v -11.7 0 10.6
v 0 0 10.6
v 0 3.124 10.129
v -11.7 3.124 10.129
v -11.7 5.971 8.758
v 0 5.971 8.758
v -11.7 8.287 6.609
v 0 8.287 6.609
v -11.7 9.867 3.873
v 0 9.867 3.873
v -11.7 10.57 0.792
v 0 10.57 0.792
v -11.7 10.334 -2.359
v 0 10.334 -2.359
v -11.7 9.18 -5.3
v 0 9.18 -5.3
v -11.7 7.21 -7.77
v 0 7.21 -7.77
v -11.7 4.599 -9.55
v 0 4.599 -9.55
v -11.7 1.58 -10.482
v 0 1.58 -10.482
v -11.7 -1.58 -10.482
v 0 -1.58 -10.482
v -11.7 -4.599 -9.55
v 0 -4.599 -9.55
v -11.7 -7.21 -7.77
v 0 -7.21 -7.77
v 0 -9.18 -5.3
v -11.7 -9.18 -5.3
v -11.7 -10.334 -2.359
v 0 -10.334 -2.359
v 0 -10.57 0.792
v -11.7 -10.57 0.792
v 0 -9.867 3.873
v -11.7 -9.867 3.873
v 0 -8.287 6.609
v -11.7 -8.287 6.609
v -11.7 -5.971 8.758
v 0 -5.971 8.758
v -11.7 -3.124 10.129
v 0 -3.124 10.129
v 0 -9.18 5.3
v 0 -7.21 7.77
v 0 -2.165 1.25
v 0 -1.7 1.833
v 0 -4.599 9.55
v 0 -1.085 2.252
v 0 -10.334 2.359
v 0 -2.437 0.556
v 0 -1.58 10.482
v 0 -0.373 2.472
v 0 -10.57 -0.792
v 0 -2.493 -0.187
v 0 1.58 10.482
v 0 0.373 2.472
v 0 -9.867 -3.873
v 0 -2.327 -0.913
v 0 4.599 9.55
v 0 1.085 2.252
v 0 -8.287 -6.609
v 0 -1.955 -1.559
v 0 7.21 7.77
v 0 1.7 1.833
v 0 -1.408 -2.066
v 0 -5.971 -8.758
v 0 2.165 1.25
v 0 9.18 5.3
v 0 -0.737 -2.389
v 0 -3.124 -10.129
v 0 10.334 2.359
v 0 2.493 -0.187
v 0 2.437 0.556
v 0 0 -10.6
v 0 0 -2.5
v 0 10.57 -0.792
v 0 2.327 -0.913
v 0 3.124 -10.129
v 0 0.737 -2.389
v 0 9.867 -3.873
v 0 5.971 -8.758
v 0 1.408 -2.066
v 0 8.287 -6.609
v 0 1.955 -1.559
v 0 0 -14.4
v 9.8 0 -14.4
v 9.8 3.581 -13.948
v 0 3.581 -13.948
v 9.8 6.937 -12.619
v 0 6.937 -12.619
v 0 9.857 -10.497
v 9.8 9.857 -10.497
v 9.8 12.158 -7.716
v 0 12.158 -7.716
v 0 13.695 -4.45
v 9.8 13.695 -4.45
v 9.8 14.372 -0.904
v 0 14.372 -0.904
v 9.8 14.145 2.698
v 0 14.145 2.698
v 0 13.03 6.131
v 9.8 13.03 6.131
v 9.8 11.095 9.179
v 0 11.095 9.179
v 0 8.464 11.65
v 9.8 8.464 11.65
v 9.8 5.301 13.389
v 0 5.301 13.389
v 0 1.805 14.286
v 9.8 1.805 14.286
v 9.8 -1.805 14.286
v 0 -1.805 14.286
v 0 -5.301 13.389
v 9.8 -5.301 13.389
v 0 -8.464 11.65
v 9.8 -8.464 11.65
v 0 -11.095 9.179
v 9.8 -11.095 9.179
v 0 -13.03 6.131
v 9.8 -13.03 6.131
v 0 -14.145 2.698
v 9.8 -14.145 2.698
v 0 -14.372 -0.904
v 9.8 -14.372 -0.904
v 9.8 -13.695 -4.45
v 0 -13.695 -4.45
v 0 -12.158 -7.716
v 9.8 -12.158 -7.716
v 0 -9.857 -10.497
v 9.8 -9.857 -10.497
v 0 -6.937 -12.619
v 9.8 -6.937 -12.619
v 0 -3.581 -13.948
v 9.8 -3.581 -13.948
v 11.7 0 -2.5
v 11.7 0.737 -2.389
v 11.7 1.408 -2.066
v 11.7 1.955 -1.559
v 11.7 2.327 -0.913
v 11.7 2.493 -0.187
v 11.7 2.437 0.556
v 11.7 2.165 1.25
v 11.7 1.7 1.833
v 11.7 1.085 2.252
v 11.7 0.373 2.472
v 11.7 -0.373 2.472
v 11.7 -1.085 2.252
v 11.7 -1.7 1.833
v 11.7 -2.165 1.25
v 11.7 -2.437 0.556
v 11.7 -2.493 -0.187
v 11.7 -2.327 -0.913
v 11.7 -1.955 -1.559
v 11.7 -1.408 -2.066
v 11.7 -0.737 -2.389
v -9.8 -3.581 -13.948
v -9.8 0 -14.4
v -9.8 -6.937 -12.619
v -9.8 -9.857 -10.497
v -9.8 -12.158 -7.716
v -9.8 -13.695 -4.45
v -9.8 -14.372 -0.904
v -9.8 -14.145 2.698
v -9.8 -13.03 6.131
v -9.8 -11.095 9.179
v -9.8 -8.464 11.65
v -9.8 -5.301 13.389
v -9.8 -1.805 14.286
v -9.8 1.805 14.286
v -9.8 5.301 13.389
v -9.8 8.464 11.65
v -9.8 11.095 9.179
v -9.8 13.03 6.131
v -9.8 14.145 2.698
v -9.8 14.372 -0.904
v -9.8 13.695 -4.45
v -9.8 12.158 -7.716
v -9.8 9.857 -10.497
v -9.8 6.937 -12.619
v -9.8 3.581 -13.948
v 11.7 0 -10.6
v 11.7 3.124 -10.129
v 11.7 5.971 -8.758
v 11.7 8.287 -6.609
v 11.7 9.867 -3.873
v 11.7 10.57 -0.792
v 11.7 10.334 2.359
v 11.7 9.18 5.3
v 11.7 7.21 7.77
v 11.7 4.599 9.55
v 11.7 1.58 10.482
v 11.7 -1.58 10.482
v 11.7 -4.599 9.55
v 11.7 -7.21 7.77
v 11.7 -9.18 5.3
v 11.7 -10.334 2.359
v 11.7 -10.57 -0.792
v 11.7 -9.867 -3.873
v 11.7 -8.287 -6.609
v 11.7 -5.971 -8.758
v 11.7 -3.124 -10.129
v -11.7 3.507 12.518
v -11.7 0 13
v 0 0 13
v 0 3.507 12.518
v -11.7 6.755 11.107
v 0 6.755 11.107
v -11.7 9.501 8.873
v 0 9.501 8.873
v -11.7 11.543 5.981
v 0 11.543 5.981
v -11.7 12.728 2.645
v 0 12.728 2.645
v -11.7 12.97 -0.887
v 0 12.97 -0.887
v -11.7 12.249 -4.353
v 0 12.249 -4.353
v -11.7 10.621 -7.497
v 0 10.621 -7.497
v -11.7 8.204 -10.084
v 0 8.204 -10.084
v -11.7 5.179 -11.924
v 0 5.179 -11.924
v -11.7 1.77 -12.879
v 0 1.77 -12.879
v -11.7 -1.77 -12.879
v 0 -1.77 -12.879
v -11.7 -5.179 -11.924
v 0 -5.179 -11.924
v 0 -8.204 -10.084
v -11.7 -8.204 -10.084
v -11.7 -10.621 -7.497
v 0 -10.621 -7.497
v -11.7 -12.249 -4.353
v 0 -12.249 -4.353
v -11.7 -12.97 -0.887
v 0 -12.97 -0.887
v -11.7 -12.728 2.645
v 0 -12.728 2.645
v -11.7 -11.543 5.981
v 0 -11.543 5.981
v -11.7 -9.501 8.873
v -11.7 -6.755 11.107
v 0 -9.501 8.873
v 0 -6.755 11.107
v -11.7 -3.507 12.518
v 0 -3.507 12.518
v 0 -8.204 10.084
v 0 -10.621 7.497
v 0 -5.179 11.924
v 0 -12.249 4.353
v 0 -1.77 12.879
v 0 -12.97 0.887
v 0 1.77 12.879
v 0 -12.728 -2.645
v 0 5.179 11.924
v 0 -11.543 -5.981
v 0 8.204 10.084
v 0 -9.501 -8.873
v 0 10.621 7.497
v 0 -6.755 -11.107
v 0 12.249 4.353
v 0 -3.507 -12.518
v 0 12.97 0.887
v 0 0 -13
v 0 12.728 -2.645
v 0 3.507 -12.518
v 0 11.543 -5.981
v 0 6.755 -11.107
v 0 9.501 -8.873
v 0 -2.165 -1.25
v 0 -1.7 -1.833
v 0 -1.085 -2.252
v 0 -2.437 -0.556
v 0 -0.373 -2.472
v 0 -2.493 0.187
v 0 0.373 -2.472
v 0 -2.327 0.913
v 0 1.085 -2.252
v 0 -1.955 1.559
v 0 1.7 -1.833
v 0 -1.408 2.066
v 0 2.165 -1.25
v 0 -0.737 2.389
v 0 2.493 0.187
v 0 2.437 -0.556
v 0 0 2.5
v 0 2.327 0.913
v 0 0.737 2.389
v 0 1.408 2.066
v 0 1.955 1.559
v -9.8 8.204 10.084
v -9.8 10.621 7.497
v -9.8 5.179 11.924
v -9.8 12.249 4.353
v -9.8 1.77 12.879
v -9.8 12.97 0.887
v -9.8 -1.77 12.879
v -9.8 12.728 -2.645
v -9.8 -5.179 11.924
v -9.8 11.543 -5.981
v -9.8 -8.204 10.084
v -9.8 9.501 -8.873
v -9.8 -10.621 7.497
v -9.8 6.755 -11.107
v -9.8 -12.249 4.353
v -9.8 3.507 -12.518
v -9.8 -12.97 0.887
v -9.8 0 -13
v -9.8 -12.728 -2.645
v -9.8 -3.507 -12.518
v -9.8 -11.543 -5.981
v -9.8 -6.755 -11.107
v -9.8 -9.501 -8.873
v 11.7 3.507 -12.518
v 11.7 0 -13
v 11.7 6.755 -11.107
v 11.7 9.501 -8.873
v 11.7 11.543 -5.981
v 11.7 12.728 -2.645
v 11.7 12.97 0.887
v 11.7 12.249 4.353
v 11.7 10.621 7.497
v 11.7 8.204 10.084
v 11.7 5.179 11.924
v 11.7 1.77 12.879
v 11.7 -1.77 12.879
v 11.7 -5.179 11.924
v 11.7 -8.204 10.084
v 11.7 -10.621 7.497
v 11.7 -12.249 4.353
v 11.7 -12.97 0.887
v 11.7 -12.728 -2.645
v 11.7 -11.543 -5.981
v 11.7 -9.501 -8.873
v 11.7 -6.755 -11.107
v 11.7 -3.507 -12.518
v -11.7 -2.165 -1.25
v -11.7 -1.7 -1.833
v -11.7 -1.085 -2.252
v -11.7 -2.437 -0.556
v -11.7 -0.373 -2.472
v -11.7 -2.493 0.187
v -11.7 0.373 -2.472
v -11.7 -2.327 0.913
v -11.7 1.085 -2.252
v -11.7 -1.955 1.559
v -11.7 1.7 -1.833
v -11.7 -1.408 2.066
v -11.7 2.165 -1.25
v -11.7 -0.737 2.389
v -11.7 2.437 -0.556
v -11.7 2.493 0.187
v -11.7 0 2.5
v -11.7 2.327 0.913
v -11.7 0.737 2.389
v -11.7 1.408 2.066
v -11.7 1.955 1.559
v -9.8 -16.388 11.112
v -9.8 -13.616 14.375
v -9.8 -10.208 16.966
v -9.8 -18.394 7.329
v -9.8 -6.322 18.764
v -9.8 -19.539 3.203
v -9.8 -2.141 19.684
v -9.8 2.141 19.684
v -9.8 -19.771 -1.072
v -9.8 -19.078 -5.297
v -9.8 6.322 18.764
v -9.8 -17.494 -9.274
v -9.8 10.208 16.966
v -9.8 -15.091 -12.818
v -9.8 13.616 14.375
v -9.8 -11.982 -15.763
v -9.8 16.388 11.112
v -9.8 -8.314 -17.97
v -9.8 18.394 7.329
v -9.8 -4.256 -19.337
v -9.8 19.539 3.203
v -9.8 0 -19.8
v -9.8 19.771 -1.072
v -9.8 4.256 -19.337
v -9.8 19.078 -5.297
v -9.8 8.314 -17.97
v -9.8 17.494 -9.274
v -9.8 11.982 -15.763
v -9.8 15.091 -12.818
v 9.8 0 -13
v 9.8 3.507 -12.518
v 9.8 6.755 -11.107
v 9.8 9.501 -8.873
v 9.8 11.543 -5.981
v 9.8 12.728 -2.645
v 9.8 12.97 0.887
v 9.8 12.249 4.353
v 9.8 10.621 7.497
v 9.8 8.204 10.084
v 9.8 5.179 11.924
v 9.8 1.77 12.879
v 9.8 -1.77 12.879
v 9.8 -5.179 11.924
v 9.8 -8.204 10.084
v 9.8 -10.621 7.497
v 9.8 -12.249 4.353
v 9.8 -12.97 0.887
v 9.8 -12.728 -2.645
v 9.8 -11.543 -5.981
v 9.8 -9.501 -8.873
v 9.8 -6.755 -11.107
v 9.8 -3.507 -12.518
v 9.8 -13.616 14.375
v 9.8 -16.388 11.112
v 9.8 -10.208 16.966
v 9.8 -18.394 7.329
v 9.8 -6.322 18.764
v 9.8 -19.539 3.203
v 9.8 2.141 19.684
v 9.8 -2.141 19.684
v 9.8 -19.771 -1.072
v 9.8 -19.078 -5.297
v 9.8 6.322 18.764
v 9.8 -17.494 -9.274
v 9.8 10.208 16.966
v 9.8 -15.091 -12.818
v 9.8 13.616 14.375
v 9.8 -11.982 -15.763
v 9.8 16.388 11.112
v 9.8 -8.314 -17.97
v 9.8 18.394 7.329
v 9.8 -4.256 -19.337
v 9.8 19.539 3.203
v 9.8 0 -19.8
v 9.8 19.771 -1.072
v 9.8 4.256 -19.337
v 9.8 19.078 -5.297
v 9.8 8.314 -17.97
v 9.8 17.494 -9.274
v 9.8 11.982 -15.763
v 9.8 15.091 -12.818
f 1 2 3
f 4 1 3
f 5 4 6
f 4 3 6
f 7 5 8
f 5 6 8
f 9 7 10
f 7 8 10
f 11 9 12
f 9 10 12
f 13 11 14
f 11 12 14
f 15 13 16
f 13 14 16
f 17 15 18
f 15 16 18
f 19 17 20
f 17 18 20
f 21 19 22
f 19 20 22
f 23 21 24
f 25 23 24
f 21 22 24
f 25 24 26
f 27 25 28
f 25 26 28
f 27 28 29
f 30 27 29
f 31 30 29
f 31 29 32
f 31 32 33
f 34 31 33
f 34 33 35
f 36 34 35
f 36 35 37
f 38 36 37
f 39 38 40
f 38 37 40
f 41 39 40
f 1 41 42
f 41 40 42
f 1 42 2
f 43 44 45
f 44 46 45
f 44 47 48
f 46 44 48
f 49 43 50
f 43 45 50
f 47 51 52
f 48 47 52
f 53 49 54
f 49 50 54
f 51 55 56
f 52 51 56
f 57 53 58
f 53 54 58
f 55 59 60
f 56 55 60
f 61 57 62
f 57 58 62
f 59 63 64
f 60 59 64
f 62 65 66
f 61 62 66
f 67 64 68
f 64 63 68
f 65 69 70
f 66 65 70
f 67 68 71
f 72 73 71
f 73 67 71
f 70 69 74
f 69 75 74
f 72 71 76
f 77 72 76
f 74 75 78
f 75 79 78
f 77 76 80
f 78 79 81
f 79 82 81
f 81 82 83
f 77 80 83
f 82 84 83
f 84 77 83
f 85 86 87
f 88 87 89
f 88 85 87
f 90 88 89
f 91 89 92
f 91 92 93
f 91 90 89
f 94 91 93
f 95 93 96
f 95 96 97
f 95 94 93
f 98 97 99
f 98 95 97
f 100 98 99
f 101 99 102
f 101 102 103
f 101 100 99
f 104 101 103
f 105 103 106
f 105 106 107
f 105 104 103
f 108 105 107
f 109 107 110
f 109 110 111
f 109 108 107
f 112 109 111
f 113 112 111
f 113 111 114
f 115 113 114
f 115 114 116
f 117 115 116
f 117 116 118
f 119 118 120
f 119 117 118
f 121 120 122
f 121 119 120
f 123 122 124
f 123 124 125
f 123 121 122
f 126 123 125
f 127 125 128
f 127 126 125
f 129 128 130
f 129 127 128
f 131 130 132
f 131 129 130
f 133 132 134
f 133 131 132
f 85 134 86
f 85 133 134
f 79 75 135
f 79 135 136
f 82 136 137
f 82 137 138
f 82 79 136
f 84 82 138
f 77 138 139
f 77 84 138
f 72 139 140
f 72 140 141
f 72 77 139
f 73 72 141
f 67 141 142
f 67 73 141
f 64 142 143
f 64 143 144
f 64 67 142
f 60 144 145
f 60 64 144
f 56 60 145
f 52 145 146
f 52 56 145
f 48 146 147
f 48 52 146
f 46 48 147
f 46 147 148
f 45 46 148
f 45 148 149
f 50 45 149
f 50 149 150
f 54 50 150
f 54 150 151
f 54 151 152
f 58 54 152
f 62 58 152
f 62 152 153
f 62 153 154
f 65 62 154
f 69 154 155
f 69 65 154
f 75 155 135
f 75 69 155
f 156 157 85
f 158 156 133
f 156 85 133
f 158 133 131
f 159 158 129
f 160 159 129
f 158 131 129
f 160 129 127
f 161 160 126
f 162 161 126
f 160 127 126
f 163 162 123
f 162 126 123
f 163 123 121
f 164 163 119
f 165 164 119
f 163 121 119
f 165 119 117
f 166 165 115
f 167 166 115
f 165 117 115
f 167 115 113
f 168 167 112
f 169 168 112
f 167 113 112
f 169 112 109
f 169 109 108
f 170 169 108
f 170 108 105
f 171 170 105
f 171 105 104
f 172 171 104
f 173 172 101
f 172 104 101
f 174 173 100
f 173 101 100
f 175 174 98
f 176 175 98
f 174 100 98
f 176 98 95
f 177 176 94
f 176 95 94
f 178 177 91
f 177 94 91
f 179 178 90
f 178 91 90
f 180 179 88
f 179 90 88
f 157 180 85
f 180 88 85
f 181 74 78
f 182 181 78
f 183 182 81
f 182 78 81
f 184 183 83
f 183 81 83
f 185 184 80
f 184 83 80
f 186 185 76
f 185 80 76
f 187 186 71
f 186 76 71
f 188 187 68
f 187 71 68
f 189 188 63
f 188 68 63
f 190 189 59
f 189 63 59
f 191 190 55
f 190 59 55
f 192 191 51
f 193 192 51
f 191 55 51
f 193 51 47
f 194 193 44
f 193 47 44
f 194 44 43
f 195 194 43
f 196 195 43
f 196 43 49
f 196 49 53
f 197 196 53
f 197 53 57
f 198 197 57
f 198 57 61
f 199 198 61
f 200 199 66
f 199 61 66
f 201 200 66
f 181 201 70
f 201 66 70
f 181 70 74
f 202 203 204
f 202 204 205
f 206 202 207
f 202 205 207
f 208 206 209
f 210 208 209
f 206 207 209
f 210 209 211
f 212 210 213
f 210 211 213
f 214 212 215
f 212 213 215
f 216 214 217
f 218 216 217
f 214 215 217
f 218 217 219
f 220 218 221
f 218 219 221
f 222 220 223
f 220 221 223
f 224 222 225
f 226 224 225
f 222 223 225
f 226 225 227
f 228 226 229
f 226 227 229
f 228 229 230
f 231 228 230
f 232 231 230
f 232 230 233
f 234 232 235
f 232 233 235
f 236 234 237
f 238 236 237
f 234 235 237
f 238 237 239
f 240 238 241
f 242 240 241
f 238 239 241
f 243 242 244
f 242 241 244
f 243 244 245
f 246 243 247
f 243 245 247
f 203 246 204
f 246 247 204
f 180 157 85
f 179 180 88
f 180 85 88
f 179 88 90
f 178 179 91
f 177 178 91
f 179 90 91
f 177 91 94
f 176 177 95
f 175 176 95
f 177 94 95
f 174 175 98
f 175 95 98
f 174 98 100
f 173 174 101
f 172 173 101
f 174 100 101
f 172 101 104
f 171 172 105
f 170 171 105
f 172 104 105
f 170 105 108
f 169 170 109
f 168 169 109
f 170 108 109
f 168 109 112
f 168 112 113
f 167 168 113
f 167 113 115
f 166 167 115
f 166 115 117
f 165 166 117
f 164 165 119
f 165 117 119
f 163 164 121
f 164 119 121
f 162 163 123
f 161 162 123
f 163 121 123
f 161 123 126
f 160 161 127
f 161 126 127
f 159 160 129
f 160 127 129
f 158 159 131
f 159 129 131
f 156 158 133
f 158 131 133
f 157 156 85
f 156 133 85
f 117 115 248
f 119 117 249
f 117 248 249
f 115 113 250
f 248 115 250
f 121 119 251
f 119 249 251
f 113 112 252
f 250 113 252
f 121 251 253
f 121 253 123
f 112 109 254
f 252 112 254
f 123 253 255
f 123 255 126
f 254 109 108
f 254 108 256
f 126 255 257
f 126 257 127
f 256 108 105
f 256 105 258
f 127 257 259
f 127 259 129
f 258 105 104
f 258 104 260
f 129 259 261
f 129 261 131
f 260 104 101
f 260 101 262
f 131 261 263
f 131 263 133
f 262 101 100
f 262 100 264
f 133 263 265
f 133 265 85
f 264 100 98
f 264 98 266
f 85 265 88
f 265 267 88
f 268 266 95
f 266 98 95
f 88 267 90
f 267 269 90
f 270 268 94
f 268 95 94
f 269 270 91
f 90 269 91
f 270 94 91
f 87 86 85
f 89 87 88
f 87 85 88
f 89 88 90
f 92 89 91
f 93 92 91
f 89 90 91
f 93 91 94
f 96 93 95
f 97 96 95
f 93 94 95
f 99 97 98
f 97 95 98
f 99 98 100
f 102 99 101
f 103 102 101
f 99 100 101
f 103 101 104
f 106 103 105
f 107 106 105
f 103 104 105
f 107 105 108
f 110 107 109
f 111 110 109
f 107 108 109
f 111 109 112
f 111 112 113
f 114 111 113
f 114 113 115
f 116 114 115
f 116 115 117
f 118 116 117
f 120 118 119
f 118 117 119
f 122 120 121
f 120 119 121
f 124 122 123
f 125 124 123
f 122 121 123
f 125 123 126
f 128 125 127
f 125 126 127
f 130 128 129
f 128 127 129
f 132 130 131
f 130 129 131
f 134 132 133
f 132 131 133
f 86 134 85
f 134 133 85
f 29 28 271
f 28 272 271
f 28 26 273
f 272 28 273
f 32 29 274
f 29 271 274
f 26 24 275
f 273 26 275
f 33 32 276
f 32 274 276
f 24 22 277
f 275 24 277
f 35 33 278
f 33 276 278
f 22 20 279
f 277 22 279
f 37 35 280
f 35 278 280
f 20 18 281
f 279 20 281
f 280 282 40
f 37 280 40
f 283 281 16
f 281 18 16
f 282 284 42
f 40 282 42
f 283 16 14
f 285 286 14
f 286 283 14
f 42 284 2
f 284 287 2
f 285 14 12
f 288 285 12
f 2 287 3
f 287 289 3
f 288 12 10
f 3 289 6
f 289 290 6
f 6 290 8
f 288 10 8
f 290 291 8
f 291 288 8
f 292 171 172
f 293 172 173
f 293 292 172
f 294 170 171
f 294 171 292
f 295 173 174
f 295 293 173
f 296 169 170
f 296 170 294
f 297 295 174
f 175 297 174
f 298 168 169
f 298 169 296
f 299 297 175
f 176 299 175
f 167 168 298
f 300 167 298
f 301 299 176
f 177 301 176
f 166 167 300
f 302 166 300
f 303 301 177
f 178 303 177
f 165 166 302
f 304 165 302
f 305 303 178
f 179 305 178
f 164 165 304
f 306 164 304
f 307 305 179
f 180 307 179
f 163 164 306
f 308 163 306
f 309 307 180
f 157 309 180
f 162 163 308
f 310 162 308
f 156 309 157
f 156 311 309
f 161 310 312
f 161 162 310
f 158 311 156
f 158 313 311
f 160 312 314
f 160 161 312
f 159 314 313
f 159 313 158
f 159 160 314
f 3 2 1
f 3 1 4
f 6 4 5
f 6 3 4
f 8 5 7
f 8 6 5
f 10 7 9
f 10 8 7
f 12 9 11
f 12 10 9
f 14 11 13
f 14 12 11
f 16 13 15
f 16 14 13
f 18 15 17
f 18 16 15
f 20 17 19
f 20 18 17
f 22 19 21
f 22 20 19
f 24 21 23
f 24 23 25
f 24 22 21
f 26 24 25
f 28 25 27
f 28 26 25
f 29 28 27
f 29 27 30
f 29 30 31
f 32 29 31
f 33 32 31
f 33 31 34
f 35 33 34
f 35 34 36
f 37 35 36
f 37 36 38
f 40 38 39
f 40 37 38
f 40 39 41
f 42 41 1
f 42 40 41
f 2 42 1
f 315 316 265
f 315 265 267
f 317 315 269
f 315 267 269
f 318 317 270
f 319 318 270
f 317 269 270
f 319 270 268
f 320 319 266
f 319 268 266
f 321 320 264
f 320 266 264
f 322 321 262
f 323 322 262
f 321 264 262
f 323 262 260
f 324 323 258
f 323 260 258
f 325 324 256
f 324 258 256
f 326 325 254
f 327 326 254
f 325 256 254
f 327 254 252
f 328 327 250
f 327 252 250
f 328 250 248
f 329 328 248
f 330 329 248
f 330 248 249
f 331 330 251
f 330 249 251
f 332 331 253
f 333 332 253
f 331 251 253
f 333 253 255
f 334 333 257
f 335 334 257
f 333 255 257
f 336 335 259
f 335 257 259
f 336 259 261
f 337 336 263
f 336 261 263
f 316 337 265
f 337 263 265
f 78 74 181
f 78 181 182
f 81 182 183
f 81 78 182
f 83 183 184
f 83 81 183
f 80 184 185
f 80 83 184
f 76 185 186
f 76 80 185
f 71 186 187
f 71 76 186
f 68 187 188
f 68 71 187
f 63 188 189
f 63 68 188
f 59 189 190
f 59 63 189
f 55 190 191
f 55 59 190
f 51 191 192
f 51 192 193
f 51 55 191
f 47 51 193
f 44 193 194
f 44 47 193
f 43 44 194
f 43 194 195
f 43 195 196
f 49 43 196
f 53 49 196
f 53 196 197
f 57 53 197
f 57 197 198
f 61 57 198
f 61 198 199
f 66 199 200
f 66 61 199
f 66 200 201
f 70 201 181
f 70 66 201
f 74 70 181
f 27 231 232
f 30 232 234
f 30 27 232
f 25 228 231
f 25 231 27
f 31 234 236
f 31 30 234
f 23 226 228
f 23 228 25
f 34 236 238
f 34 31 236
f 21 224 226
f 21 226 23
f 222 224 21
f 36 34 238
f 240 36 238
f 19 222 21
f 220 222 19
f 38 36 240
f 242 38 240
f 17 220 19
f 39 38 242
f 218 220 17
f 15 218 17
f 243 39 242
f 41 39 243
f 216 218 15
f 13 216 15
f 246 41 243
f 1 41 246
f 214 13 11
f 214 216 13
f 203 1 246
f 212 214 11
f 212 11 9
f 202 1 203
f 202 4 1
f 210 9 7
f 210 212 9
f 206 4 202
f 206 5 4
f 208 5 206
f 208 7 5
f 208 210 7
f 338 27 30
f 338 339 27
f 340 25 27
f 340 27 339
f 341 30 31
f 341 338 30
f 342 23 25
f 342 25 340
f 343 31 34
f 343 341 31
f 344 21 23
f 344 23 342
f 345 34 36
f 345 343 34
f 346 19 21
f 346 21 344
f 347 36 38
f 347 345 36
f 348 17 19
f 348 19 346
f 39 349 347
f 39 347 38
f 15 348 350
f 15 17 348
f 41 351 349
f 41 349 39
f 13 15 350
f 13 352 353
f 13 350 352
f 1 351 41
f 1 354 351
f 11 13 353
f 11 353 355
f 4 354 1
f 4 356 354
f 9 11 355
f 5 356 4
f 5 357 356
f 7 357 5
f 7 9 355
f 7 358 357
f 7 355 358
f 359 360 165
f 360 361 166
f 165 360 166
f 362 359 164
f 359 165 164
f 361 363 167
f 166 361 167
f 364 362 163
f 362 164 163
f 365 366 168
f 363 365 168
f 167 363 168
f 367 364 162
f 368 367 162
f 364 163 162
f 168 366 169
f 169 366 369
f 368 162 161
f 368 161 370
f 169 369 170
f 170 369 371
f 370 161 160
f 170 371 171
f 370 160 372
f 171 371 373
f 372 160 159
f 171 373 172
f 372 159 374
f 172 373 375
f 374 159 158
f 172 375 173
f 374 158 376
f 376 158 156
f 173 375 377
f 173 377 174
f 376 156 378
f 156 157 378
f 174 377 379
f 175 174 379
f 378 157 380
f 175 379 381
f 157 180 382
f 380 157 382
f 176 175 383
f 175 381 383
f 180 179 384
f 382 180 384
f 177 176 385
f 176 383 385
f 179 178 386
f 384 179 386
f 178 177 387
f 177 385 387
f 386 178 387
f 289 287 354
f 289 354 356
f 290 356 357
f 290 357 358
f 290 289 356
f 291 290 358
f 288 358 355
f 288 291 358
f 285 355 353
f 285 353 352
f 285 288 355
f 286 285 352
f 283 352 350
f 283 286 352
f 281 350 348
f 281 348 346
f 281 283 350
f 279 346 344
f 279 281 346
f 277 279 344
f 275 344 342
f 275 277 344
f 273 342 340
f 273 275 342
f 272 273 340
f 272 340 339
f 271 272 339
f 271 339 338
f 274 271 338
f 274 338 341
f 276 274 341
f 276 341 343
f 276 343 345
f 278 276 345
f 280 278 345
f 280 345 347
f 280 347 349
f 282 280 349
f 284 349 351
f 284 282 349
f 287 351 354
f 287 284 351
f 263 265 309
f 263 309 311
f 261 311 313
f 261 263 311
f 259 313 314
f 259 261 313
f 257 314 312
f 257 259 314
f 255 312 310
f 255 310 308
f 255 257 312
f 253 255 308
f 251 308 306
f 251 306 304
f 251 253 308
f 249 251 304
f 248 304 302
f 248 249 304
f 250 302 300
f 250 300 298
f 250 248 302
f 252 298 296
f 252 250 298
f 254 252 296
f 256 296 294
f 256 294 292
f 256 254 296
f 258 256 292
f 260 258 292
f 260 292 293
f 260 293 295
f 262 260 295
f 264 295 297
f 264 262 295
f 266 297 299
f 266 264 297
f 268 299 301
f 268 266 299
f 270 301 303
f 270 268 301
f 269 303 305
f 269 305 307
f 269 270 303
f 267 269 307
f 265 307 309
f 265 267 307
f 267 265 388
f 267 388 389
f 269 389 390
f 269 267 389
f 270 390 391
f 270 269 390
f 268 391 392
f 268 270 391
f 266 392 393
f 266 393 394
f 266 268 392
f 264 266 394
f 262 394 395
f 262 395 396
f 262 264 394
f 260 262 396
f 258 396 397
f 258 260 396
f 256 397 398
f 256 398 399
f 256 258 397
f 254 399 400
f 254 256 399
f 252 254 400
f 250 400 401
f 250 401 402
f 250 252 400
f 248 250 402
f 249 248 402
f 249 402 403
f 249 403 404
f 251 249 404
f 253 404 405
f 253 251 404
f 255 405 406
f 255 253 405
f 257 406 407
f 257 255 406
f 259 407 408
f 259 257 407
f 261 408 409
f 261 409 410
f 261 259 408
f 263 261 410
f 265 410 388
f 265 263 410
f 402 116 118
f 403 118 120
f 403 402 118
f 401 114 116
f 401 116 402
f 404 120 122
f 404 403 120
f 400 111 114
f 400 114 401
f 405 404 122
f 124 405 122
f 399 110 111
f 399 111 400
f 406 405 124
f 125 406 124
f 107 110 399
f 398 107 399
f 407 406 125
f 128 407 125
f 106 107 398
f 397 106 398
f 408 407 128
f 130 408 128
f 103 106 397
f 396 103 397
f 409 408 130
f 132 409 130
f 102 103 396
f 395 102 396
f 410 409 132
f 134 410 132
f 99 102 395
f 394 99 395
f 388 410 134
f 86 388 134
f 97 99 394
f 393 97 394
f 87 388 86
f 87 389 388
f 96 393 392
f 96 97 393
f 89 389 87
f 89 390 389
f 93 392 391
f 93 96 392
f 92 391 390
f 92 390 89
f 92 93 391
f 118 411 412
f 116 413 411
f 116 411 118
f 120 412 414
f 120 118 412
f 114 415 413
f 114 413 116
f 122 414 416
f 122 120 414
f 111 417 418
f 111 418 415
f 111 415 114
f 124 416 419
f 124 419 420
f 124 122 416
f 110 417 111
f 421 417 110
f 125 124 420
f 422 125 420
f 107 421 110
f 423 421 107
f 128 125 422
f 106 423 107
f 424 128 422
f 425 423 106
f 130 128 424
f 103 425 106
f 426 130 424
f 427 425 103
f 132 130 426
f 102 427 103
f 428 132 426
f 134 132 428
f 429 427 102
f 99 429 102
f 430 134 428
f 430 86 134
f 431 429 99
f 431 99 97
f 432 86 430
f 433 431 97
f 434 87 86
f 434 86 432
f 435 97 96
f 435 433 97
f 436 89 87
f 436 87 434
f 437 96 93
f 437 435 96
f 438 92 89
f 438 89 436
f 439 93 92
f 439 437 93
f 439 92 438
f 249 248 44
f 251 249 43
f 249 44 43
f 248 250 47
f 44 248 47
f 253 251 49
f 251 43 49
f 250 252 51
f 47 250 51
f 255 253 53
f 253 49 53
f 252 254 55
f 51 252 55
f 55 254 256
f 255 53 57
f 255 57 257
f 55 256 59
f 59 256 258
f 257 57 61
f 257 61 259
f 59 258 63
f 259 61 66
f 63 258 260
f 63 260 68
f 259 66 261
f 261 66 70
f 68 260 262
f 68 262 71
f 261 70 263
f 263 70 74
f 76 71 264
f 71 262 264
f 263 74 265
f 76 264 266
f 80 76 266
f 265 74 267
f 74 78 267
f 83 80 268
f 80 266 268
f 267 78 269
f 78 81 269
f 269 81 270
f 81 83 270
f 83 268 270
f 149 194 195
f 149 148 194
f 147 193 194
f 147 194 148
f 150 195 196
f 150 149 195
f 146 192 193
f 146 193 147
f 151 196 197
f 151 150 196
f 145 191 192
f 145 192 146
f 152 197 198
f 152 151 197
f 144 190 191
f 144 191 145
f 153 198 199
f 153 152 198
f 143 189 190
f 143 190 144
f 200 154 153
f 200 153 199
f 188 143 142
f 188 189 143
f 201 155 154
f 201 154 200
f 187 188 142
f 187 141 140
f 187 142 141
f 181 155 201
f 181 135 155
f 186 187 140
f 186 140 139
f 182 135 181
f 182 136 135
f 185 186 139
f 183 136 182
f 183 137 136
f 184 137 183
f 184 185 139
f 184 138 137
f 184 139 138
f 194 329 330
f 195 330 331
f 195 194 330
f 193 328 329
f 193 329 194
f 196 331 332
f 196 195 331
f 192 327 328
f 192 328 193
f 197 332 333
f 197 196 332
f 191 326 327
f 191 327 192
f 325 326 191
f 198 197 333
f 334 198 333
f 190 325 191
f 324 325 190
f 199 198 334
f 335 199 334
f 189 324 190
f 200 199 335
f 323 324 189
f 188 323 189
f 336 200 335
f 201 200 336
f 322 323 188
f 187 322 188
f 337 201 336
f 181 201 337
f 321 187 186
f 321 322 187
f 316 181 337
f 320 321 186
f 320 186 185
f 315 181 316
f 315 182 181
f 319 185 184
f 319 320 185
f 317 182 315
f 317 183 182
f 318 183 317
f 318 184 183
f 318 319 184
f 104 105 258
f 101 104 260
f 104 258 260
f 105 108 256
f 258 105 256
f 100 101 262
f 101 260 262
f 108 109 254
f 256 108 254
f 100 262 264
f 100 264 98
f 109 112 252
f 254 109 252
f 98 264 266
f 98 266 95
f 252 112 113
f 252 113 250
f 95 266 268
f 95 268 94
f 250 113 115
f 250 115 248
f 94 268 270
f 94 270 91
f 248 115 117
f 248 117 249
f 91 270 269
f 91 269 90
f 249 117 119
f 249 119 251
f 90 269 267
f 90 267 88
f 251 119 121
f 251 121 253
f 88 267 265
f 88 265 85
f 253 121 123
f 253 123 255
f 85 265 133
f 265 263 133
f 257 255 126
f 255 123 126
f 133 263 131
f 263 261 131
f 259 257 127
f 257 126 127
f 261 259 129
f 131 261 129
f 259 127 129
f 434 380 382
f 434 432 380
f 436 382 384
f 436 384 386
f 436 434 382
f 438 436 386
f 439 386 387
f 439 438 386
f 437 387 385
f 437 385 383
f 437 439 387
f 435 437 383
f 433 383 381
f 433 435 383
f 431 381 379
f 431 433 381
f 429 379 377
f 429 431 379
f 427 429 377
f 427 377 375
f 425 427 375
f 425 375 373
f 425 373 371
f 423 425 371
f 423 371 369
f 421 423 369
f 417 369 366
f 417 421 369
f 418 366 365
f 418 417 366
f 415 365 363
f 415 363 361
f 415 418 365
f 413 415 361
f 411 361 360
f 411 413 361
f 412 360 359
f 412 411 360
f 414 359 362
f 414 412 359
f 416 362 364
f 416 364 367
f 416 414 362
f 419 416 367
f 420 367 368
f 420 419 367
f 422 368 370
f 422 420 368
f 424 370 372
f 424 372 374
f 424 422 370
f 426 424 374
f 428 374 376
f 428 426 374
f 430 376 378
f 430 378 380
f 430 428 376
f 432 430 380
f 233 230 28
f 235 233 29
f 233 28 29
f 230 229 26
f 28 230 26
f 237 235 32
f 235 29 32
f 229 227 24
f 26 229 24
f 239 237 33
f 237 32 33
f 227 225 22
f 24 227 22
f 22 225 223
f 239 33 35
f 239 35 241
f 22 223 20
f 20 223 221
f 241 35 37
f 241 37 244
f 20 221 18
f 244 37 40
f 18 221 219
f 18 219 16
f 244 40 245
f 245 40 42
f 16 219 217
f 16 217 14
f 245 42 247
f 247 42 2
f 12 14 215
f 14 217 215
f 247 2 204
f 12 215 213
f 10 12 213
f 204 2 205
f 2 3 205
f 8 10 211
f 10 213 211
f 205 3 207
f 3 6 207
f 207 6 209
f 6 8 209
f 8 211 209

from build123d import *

# Parameters (mm, degrees)
SKETCH1_R            = 19.8
SKETCH1_R_2          = 14.4
BOSS_EXTRUDE4_DEPTH  = 9.8
SKETCH1_6_R          = 14.4
SKETCH1_6_R_2        = 13
BOSS_EXTRUDE5_DEPTH  = 9.8
SKETCH1_7_R          = 13
SKETCH1_7_R_2        = 10.6
BOSS_EXTRUDE6_DEPTH  = 11.7
SKETCH1_8_R          = 10.6
SKETCH1_8_R_2        = 2.5
BOSS_EXTRUDE7_DEPTH  = 11.7
SKETCH2_R            = 14.4
SKETCH2_R_2          = 13
BOSS_EXTRUDE8_DEPTH  = 9.8
SKETCH3_R            = 13
SKETCH3_R_2          = 10.6
BOSS_EXTRUDE9_DEPTH  = 11.7
SKETCH4_R            = 10.6
SKETCH4_R_2          = 2.5
BOSS_EXTRUDE10_DEPTH = 11.7


with BuildPart() as part:
    # Sketch1 → Boss-Extrude4 (new body)
    with BuildSketch(Plane(origin=(0, 0, 0), x_dir=(0, 0, -1), z_dir=(1, 0, 0))):
        Circle(SKETCH1_R)
        Circle(SKETCH1_R_2, mode=Mode.SUBTRACT)
    boss_extrude4 = extrude(amount=BOSS_EXTRUDE4_DEPTH)

    # Mirror3: Boss-Extrude4 across plane
    add(boss_extrude4.mirror(Plane(origin=(0, 0, 0), x_dir=(0, 0, 1), z_dir=(1, 0, 0))))


with BuildPart() as body_2:
    # Sketch1<6> → Boss-Extrude5 (new body)
    with BuildSketch(Plane(origin=(0, 0, 0), x_dir=(0, 0, -1), z_dir=(1, 0, 0))):
        Circle(SKETCH1_6_R)
        Circle(SKETCH1_6_R_2, mode=Mode.SUBTRACT)
    extrude(amount=BOSS_EXTRUDE5_DEPTH)


with BuildPart() as body_3:
    # Sketch1<7> → Boss-Extrude6 (new body)
    with BuildSketch(Plane(origin=(0, 0, 0), x_dir=(0, 0, -1), z_dir=(1, 0, 0))):
        Circle(SKETCH1_7_R)
        Circle(SKETCH1_7_R_2, mode=Mode.SUBTRACT)
    extrude(amount=BOSS_EXTRUDE6_DEPTH)


with BuildPart() as body_4:
    # Sketch1<8> → Boss-Extrude7 (new body)
    with BuildSketch(Plane(origin=(0, 0, 0), x_dir=(0, 0, -1), z_dir=(1, 0, 0))):
        Circle(SKETCH1_8_R)
        Circle(SKETCH1_8_R_2, mode=Mode.SUBTRACT)
    extrude(amount=BOSS_EXTRUDE7_DEPTH)


with BuildPart() as body_5:
    # Sketch2 → Boss-Extrude8 (new body)
    with BuildSketch(Plane.ZY):
        with Locations(Location((0, 0, 0), (0, 0, 180))):
            Circle(SKETCH2_R)
        with Locations(Location((0, 0, 0), (0, 0, 180))):
            Circle(SKETCH2_R_2, mode=Mode.SUBTRACT)
    extrude(amount=BOSS_EXTRUDE8_DEPTH)


with BuildPart() as body_6:
    # Sketch3 → Boss-Extrude9 (new body)
    with BuildSketch(Plane.ZY):
        Circle(SKETCH3_R)
        Circle(SKETCH3_R_2, mode=Mode.SUBTRACT)
    extrude(amount=BOSS_EXTRUDE9_DEPTH)


with BuildPart() as body_7:
    # Sketch4 → Boss-Extrude10 (new body)
    with BuildSketch(Plane.ZY):
        Circle(SKETCH4_R)
        Circle(SKETCH4_R_2, mode=Mode.SUBTRACT)
    extrude(amount=BOSS_EXTRUDE10_DEPTH)


solid = Compound([part.part, body_2.part, body_3.part, body_4.part, body_5.part, body_6.part, body_7.part])
